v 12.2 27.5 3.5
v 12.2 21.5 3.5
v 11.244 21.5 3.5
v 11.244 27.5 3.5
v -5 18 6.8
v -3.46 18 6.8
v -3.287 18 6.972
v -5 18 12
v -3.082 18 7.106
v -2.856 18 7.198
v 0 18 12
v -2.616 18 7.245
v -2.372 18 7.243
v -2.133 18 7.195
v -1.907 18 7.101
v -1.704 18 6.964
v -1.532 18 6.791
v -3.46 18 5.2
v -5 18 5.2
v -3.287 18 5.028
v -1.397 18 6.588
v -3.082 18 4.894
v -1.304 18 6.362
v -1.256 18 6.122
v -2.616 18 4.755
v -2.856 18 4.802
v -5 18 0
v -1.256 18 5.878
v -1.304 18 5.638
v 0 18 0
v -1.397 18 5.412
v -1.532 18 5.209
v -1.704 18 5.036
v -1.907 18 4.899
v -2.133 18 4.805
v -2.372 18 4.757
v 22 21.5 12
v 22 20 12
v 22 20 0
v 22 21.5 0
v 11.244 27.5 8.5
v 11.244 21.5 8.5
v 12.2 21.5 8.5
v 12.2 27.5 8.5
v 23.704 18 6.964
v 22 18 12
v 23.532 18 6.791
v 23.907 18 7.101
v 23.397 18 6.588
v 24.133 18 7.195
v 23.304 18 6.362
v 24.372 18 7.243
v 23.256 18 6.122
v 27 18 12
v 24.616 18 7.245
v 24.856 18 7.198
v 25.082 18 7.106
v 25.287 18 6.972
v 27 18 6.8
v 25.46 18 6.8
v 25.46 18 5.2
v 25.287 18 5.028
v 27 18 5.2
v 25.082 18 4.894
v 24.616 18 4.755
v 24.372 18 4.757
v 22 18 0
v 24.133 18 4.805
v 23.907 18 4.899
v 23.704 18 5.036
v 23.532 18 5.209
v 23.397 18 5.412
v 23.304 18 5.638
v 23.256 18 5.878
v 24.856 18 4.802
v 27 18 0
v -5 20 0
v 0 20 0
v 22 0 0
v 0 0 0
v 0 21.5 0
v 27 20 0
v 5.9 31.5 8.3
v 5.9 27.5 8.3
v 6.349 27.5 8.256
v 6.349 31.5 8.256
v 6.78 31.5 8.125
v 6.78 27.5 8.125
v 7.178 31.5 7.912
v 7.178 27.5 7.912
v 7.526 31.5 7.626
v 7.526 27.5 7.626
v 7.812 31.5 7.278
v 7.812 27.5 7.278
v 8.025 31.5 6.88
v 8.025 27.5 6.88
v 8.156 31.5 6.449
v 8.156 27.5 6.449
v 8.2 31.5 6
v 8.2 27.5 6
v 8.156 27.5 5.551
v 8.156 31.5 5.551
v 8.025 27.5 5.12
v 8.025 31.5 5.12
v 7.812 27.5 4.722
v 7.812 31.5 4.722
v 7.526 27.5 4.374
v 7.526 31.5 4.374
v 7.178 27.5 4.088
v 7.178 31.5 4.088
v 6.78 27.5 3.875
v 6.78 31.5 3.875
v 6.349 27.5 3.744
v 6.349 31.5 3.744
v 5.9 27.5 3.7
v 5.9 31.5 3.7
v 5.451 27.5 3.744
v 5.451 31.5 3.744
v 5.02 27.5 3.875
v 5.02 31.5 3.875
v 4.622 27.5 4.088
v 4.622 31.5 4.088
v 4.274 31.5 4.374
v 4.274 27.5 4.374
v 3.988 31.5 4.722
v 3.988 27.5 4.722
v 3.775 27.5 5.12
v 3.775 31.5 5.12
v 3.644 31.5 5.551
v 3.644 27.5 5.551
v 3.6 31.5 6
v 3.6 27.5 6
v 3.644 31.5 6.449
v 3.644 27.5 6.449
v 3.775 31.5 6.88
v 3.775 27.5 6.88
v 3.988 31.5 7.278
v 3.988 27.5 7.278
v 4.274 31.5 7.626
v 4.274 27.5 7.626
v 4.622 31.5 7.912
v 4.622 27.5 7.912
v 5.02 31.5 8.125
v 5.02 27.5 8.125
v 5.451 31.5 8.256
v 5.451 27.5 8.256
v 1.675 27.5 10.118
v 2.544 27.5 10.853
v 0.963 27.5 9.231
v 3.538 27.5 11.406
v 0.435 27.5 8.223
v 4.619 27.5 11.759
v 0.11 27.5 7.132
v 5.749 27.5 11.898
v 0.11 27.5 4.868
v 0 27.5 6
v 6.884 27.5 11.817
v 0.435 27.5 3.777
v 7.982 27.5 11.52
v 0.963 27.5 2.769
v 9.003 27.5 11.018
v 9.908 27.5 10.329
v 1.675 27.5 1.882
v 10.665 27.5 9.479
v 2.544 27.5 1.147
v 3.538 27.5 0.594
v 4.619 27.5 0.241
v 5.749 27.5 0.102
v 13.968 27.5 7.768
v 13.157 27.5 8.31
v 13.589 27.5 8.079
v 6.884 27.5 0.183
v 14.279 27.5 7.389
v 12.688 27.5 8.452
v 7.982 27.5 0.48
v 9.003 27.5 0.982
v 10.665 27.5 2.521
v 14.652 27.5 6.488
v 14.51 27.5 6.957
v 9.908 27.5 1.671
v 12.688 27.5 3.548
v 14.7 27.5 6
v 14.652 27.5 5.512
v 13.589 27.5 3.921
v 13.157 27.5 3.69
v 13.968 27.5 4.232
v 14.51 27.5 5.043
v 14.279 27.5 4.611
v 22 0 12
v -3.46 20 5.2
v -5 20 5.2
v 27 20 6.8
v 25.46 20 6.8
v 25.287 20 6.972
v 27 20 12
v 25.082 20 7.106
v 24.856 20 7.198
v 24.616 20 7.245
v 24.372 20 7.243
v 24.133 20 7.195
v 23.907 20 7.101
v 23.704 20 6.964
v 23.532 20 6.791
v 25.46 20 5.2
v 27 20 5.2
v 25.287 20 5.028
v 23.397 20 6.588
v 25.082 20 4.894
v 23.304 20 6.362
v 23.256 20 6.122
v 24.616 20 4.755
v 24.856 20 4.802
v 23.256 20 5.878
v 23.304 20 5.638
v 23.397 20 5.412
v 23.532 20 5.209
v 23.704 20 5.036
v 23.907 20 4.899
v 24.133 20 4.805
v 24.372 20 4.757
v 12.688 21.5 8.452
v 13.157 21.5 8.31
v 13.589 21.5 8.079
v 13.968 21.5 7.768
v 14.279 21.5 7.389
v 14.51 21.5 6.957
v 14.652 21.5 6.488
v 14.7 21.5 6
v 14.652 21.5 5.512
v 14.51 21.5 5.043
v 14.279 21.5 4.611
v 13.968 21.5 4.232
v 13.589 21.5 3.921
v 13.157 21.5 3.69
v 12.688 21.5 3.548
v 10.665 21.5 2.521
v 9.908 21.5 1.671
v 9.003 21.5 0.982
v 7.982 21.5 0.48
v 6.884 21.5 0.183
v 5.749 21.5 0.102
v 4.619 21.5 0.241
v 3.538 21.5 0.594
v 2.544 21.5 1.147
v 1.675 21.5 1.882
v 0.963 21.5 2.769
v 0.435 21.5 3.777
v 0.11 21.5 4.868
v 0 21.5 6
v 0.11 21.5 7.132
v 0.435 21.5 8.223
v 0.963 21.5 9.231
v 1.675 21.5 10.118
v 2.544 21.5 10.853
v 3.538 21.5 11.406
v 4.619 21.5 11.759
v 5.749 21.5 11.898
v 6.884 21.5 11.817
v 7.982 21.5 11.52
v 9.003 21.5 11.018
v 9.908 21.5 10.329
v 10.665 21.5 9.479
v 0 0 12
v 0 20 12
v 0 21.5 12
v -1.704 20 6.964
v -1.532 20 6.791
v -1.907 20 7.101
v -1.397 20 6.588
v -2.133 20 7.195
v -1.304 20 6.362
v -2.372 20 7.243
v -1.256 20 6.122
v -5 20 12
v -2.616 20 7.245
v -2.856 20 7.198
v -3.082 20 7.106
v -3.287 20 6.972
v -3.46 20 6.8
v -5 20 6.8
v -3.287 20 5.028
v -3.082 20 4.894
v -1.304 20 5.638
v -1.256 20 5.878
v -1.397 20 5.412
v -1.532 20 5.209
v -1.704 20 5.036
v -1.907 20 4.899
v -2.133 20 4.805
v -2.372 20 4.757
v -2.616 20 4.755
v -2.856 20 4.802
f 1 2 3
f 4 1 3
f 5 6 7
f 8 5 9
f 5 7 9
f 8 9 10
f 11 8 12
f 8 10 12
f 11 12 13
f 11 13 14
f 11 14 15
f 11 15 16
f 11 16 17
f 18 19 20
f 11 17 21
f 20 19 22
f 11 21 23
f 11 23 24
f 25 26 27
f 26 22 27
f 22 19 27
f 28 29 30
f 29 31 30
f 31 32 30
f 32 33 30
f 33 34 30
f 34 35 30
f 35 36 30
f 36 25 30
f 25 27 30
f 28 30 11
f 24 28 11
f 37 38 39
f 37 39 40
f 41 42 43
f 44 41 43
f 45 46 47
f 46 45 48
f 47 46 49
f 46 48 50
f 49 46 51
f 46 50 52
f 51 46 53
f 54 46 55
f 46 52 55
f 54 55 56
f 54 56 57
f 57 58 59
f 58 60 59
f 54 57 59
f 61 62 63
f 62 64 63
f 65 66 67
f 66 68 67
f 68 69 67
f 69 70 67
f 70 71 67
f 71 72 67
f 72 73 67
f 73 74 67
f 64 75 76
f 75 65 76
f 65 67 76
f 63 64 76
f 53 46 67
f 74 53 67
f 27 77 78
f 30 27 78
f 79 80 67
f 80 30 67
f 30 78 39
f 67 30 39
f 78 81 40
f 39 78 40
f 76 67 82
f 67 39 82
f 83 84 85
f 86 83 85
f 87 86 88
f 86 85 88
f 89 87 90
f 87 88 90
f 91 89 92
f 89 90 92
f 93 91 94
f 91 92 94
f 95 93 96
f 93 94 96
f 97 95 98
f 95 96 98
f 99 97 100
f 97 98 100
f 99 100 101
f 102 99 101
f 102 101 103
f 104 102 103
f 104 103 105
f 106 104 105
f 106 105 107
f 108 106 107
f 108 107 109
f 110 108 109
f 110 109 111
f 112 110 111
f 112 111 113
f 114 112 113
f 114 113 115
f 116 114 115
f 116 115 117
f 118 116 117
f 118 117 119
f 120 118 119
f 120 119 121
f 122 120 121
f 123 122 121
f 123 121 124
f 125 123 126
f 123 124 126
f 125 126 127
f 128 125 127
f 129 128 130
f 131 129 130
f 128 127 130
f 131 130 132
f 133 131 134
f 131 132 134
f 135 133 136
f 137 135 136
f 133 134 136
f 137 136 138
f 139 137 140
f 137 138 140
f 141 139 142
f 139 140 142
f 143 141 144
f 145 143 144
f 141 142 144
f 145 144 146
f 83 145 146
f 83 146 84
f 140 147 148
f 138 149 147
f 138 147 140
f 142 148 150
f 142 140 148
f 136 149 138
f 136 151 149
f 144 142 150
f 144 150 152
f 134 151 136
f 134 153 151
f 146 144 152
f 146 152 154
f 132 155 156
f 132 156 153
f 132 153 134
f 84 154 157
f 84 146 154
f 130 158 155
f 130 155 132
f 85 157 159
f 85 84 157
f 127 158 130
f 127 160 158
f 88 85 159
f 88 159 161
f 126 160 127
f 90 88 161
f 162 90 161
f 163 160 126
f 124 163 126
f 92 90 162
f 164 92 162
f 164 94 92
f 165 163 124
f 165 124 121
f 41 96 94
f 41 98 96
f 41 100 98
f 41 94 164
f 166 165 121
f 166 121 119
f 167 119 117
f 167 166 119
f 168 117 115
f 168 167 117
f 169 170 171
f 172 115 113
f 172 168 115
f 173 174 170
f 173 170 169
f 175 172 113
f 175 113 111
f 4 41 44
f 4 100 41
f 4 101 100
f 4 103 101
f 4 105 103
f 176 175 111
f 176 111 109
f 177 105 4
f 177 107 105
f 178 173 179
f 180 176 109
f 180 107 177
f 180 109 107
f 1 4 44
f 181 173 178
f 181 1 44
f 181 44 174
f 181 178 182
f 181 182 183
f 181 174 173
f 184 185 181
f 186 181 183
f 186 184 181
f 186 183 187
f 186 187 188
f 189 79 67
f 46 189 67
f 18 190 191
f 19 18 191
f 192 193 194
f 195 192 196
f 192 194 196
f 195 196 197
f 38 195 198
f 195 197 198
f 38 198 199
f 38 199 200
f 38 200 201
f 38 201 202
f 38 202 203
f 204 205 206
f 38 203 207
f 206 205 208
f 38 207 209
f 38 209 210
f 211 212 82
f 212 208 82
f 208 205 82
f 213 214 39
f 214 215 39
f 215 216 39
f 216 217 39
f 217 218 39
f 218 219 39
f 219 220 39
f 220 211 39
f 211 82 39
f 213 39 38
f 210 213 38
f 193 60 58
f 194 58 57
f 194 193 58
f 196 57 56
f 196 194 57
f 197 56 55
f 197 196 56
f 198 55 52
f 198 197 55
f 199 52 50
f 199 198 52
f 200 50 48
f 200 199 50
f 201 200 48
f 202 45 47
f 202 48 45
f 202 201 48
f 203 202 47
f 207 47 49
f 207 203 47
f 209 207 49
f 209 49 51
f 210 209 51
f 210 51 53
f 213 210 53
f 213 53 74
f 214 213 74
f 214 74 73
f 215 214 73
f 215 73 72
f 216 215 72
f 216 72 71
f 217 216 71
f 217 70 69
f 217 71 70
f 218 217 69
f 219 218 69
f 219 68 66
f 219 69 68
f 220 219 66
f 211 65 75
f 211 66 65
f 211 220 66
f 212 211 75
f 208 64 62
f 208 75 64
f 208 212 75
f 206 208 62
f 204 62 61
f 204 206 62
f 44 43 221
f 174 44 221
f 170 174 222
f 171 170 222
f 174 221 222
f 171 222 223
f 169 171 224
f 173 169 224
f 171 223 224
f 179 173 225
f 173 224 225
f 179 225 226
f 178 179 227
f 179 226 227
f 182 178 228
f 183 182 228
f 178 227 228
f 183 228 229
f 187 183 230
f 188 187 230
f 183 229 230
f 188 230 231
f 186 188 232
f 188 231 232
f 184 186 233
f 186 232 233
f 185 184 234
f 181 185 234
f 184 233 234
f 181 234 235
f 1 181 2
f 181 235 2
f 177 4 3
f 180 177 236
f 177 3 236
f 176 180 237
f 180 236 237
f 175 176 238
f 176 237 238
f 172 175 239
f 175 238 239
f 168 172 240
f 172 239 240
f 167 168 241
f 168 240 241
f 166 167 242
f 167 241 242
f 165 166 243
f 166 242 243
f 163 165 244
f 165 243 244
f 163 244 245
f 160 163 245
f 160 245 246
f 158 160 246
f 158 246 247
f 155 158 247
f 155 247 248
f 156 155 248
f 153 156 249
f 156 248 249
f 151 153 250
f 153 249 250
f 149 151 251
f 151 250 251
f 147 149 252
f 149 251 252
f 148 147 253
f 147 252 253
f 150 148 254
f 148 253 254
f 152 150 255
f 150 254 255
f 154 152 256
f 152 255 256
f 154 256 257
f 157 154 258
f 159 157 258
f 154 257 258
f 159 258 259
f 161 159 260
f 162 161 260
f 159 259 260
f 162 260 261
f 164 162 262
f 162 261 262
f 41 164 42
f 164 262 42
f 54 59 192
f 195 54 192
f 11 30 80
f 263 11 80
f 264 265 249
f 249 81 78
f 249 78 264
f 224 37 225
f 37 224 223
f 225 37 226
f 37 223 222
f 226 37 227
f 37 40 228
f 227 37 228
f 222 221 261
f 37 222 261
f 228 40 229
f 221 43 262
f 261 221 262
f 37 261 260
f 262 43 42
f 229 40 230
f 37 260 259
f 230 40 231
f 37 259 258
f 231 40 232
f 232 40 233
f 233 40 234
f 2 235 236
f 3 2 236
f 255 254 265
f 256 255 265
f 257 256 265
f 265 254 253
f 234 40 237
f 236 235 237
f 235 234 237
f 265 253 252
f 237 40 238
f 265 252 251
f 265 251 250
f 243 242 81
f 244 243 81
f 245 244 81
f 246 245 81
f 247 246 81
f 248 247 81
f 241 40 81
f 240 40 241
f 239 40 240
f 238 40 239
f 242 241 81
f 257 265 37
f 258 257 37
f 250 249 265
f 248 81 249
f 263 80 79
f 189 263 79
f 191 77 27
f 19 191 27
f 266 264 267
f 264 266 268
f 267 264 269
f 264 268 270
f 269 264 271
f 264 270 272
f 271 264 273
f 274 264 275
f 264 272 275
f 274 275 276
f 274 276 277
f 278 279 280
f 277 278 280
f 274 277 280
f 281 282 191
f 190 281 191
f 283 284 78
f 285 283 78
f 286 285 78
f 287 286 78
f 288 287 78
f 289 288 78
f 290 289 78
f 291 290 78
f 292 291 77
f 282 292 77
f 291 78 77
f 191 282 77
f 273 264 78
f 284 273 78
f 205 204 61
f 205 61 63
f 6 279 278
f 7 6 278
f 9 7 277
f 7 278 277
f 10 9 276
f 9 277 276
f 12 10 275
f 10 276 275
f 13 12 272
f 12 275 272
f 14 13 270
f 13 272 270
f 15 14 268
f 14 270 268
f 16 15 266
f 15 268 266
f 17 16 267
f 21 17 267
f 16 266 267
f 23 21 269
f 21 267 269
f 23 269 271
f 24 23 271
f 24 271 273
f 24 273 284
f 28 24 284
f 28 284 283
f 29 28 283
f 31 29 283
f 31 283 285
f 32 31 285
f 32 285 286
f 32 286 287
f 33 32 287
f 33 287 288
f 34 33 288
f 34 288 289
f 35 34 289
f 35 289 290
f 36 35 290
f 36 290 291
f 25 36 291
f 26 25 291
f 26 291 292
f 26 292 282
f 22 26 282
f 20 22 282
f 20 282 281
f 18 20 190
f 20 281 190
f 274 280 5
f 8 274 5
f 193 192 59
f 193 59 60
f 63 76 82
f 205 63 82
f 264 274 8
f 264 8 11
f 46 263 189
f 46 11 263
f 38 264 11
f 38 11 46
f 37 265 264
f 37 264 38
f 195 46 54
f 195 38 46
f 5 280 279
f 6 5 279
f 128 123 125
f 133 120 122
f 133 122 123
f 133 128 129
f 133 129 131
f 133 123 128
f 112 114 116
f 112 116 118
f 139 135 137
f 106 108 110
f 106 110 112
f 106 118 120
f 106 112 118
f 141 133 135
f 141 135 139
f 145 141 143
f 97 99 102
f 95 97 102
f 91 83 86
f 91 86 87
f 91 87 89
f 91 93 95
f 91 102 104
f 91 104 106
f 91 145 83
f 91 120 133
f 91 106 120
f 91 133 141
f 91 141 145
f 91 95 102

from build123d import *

# Parameters (mm, degrees)
EXTRUDE_1_DEPTH     = 12
SKETCH_2_R          = 2.3
EXTRUDE_2_DEPTH     = 6
SKETCH_3_R          = 2.3
EXTRUDE_3_DEPTH     = 10
CUT_EXTRUDE_1_REACH = 37.679


with BuildPart() as part:
    # 草图1 → 凸台-拉伸1 (new body)
    with BuildSketch(Plane.XY):
        Polygon((0, 0), (22, 0), (22, 18), (27, 18), (27, 20), (22, 20), (22, 21.5), (0, 21.5), (0, 20), (-5, 20), (-5, 18), (0, 18), align=None)
    extrude(amount=EXTRUDE_1_DEPTH)

    # 草图2 → 凸台-拉伸2 (add)
    with BuildSketch(Plane(origin=(0, 21.5, 0), x_dir=(1, 0, 0), z_dir=(0, 1, 0))):
        with BuildLine():
            Line((12.2, -3.5), (11.244155686, -3.5))
            ThreePointArc((11.244155686, -3.5), (0, -6), (11.244155686, -8.5))
            Line((11.244155686, -8.5), (12.2, -8.5))
            ThreePointArc((12.2, -8.5), (14.7, -6), (12.2, -3.5))
        make_face()
        with Locations(Location((5.9, -6, 0), (0, 0, 270))):
            Circle(SKETCH_2_R, mode=Mode.SUBTRACT)
    extrude(amount=EXTRUDE_2_DEPTH)

    # 草图3 → 凸台-拉伸3 (add)
    with BuildSketch(Plane(origin=(0, 21.5, 0), x_dir=(1, 0, 0), z_dir=(0, 1, 0))):
        with Locations(Location((5.9, -6, 0), (0, 0, 270))):
            Circle(SKETCH_3_R)
    extrude(amount=EXTRUDE_3_DEPTH)

    # 草图4 → 切除-拉伸1 (cut, up to next)
    with BuildSketch(Plane(origin=(0, 20, 0), x_dir=(1, 0, 0), z_dir=(0, 1, 0)), mode=Mode.PRIVATE) as cut_extrude_1_sk1:
        with BuildLine():
            Line((27, -5.2), (27, -6.8))
            Line((27, -6.8), (25.460468636, -6.8))
            ThreePointArc((25.460468636, -6.8), (23.25, -6), (25.460468636, -5.2))
            Line((25.460468636, -5.2), (27, -5.2))
        make_face()
    cut_extrude_1_tool1 = extrude(cut_extrude_1_sk1.sketch, amount=-CUT_EXTRUDE_1_REACH, mode=Mode.PRIVATE) & part.part
    # 草图4 → 切除-拉伸1 (cut, up to next)
    with BuildSketch(Plane(origin=(0, 20, 0), x_dir=(1, 0, 0), z_dir=(0, 1, 0)), mode=Mode.PRIVATE) as cut_extrude_1_sk2:
        with BuildLine():
            Line((-5, -5.2), (-5, -6.8))
            Line((-5, -6.8), (-3.460468636, -6.8))
            ThreePointArc((-3.460468636, -6.8), (-1.25, -6), (-3.460468636, -5.2))
            Line((-3.460468636, -5.2), (-5, -5.2))
        make_face()
    cut_extrude_1_tool2 = extrude(cut_extrude_1_sk2.sketch, amount=-CUT_EXTRUDE_1_REACH, mode=Mode.PRIVATE) & part.part
    add(cut_extrude_1_tool1.solids().sort_by_distance((25.055712, 20, 6))[0], mode=Mode.SUBTRACT)
    add(cut_extrude_1_tool2.solids().sort_by_distance((-3.055712, 20, 6))[0], mode=Mode.SUBTRACT)


solid = part.part
